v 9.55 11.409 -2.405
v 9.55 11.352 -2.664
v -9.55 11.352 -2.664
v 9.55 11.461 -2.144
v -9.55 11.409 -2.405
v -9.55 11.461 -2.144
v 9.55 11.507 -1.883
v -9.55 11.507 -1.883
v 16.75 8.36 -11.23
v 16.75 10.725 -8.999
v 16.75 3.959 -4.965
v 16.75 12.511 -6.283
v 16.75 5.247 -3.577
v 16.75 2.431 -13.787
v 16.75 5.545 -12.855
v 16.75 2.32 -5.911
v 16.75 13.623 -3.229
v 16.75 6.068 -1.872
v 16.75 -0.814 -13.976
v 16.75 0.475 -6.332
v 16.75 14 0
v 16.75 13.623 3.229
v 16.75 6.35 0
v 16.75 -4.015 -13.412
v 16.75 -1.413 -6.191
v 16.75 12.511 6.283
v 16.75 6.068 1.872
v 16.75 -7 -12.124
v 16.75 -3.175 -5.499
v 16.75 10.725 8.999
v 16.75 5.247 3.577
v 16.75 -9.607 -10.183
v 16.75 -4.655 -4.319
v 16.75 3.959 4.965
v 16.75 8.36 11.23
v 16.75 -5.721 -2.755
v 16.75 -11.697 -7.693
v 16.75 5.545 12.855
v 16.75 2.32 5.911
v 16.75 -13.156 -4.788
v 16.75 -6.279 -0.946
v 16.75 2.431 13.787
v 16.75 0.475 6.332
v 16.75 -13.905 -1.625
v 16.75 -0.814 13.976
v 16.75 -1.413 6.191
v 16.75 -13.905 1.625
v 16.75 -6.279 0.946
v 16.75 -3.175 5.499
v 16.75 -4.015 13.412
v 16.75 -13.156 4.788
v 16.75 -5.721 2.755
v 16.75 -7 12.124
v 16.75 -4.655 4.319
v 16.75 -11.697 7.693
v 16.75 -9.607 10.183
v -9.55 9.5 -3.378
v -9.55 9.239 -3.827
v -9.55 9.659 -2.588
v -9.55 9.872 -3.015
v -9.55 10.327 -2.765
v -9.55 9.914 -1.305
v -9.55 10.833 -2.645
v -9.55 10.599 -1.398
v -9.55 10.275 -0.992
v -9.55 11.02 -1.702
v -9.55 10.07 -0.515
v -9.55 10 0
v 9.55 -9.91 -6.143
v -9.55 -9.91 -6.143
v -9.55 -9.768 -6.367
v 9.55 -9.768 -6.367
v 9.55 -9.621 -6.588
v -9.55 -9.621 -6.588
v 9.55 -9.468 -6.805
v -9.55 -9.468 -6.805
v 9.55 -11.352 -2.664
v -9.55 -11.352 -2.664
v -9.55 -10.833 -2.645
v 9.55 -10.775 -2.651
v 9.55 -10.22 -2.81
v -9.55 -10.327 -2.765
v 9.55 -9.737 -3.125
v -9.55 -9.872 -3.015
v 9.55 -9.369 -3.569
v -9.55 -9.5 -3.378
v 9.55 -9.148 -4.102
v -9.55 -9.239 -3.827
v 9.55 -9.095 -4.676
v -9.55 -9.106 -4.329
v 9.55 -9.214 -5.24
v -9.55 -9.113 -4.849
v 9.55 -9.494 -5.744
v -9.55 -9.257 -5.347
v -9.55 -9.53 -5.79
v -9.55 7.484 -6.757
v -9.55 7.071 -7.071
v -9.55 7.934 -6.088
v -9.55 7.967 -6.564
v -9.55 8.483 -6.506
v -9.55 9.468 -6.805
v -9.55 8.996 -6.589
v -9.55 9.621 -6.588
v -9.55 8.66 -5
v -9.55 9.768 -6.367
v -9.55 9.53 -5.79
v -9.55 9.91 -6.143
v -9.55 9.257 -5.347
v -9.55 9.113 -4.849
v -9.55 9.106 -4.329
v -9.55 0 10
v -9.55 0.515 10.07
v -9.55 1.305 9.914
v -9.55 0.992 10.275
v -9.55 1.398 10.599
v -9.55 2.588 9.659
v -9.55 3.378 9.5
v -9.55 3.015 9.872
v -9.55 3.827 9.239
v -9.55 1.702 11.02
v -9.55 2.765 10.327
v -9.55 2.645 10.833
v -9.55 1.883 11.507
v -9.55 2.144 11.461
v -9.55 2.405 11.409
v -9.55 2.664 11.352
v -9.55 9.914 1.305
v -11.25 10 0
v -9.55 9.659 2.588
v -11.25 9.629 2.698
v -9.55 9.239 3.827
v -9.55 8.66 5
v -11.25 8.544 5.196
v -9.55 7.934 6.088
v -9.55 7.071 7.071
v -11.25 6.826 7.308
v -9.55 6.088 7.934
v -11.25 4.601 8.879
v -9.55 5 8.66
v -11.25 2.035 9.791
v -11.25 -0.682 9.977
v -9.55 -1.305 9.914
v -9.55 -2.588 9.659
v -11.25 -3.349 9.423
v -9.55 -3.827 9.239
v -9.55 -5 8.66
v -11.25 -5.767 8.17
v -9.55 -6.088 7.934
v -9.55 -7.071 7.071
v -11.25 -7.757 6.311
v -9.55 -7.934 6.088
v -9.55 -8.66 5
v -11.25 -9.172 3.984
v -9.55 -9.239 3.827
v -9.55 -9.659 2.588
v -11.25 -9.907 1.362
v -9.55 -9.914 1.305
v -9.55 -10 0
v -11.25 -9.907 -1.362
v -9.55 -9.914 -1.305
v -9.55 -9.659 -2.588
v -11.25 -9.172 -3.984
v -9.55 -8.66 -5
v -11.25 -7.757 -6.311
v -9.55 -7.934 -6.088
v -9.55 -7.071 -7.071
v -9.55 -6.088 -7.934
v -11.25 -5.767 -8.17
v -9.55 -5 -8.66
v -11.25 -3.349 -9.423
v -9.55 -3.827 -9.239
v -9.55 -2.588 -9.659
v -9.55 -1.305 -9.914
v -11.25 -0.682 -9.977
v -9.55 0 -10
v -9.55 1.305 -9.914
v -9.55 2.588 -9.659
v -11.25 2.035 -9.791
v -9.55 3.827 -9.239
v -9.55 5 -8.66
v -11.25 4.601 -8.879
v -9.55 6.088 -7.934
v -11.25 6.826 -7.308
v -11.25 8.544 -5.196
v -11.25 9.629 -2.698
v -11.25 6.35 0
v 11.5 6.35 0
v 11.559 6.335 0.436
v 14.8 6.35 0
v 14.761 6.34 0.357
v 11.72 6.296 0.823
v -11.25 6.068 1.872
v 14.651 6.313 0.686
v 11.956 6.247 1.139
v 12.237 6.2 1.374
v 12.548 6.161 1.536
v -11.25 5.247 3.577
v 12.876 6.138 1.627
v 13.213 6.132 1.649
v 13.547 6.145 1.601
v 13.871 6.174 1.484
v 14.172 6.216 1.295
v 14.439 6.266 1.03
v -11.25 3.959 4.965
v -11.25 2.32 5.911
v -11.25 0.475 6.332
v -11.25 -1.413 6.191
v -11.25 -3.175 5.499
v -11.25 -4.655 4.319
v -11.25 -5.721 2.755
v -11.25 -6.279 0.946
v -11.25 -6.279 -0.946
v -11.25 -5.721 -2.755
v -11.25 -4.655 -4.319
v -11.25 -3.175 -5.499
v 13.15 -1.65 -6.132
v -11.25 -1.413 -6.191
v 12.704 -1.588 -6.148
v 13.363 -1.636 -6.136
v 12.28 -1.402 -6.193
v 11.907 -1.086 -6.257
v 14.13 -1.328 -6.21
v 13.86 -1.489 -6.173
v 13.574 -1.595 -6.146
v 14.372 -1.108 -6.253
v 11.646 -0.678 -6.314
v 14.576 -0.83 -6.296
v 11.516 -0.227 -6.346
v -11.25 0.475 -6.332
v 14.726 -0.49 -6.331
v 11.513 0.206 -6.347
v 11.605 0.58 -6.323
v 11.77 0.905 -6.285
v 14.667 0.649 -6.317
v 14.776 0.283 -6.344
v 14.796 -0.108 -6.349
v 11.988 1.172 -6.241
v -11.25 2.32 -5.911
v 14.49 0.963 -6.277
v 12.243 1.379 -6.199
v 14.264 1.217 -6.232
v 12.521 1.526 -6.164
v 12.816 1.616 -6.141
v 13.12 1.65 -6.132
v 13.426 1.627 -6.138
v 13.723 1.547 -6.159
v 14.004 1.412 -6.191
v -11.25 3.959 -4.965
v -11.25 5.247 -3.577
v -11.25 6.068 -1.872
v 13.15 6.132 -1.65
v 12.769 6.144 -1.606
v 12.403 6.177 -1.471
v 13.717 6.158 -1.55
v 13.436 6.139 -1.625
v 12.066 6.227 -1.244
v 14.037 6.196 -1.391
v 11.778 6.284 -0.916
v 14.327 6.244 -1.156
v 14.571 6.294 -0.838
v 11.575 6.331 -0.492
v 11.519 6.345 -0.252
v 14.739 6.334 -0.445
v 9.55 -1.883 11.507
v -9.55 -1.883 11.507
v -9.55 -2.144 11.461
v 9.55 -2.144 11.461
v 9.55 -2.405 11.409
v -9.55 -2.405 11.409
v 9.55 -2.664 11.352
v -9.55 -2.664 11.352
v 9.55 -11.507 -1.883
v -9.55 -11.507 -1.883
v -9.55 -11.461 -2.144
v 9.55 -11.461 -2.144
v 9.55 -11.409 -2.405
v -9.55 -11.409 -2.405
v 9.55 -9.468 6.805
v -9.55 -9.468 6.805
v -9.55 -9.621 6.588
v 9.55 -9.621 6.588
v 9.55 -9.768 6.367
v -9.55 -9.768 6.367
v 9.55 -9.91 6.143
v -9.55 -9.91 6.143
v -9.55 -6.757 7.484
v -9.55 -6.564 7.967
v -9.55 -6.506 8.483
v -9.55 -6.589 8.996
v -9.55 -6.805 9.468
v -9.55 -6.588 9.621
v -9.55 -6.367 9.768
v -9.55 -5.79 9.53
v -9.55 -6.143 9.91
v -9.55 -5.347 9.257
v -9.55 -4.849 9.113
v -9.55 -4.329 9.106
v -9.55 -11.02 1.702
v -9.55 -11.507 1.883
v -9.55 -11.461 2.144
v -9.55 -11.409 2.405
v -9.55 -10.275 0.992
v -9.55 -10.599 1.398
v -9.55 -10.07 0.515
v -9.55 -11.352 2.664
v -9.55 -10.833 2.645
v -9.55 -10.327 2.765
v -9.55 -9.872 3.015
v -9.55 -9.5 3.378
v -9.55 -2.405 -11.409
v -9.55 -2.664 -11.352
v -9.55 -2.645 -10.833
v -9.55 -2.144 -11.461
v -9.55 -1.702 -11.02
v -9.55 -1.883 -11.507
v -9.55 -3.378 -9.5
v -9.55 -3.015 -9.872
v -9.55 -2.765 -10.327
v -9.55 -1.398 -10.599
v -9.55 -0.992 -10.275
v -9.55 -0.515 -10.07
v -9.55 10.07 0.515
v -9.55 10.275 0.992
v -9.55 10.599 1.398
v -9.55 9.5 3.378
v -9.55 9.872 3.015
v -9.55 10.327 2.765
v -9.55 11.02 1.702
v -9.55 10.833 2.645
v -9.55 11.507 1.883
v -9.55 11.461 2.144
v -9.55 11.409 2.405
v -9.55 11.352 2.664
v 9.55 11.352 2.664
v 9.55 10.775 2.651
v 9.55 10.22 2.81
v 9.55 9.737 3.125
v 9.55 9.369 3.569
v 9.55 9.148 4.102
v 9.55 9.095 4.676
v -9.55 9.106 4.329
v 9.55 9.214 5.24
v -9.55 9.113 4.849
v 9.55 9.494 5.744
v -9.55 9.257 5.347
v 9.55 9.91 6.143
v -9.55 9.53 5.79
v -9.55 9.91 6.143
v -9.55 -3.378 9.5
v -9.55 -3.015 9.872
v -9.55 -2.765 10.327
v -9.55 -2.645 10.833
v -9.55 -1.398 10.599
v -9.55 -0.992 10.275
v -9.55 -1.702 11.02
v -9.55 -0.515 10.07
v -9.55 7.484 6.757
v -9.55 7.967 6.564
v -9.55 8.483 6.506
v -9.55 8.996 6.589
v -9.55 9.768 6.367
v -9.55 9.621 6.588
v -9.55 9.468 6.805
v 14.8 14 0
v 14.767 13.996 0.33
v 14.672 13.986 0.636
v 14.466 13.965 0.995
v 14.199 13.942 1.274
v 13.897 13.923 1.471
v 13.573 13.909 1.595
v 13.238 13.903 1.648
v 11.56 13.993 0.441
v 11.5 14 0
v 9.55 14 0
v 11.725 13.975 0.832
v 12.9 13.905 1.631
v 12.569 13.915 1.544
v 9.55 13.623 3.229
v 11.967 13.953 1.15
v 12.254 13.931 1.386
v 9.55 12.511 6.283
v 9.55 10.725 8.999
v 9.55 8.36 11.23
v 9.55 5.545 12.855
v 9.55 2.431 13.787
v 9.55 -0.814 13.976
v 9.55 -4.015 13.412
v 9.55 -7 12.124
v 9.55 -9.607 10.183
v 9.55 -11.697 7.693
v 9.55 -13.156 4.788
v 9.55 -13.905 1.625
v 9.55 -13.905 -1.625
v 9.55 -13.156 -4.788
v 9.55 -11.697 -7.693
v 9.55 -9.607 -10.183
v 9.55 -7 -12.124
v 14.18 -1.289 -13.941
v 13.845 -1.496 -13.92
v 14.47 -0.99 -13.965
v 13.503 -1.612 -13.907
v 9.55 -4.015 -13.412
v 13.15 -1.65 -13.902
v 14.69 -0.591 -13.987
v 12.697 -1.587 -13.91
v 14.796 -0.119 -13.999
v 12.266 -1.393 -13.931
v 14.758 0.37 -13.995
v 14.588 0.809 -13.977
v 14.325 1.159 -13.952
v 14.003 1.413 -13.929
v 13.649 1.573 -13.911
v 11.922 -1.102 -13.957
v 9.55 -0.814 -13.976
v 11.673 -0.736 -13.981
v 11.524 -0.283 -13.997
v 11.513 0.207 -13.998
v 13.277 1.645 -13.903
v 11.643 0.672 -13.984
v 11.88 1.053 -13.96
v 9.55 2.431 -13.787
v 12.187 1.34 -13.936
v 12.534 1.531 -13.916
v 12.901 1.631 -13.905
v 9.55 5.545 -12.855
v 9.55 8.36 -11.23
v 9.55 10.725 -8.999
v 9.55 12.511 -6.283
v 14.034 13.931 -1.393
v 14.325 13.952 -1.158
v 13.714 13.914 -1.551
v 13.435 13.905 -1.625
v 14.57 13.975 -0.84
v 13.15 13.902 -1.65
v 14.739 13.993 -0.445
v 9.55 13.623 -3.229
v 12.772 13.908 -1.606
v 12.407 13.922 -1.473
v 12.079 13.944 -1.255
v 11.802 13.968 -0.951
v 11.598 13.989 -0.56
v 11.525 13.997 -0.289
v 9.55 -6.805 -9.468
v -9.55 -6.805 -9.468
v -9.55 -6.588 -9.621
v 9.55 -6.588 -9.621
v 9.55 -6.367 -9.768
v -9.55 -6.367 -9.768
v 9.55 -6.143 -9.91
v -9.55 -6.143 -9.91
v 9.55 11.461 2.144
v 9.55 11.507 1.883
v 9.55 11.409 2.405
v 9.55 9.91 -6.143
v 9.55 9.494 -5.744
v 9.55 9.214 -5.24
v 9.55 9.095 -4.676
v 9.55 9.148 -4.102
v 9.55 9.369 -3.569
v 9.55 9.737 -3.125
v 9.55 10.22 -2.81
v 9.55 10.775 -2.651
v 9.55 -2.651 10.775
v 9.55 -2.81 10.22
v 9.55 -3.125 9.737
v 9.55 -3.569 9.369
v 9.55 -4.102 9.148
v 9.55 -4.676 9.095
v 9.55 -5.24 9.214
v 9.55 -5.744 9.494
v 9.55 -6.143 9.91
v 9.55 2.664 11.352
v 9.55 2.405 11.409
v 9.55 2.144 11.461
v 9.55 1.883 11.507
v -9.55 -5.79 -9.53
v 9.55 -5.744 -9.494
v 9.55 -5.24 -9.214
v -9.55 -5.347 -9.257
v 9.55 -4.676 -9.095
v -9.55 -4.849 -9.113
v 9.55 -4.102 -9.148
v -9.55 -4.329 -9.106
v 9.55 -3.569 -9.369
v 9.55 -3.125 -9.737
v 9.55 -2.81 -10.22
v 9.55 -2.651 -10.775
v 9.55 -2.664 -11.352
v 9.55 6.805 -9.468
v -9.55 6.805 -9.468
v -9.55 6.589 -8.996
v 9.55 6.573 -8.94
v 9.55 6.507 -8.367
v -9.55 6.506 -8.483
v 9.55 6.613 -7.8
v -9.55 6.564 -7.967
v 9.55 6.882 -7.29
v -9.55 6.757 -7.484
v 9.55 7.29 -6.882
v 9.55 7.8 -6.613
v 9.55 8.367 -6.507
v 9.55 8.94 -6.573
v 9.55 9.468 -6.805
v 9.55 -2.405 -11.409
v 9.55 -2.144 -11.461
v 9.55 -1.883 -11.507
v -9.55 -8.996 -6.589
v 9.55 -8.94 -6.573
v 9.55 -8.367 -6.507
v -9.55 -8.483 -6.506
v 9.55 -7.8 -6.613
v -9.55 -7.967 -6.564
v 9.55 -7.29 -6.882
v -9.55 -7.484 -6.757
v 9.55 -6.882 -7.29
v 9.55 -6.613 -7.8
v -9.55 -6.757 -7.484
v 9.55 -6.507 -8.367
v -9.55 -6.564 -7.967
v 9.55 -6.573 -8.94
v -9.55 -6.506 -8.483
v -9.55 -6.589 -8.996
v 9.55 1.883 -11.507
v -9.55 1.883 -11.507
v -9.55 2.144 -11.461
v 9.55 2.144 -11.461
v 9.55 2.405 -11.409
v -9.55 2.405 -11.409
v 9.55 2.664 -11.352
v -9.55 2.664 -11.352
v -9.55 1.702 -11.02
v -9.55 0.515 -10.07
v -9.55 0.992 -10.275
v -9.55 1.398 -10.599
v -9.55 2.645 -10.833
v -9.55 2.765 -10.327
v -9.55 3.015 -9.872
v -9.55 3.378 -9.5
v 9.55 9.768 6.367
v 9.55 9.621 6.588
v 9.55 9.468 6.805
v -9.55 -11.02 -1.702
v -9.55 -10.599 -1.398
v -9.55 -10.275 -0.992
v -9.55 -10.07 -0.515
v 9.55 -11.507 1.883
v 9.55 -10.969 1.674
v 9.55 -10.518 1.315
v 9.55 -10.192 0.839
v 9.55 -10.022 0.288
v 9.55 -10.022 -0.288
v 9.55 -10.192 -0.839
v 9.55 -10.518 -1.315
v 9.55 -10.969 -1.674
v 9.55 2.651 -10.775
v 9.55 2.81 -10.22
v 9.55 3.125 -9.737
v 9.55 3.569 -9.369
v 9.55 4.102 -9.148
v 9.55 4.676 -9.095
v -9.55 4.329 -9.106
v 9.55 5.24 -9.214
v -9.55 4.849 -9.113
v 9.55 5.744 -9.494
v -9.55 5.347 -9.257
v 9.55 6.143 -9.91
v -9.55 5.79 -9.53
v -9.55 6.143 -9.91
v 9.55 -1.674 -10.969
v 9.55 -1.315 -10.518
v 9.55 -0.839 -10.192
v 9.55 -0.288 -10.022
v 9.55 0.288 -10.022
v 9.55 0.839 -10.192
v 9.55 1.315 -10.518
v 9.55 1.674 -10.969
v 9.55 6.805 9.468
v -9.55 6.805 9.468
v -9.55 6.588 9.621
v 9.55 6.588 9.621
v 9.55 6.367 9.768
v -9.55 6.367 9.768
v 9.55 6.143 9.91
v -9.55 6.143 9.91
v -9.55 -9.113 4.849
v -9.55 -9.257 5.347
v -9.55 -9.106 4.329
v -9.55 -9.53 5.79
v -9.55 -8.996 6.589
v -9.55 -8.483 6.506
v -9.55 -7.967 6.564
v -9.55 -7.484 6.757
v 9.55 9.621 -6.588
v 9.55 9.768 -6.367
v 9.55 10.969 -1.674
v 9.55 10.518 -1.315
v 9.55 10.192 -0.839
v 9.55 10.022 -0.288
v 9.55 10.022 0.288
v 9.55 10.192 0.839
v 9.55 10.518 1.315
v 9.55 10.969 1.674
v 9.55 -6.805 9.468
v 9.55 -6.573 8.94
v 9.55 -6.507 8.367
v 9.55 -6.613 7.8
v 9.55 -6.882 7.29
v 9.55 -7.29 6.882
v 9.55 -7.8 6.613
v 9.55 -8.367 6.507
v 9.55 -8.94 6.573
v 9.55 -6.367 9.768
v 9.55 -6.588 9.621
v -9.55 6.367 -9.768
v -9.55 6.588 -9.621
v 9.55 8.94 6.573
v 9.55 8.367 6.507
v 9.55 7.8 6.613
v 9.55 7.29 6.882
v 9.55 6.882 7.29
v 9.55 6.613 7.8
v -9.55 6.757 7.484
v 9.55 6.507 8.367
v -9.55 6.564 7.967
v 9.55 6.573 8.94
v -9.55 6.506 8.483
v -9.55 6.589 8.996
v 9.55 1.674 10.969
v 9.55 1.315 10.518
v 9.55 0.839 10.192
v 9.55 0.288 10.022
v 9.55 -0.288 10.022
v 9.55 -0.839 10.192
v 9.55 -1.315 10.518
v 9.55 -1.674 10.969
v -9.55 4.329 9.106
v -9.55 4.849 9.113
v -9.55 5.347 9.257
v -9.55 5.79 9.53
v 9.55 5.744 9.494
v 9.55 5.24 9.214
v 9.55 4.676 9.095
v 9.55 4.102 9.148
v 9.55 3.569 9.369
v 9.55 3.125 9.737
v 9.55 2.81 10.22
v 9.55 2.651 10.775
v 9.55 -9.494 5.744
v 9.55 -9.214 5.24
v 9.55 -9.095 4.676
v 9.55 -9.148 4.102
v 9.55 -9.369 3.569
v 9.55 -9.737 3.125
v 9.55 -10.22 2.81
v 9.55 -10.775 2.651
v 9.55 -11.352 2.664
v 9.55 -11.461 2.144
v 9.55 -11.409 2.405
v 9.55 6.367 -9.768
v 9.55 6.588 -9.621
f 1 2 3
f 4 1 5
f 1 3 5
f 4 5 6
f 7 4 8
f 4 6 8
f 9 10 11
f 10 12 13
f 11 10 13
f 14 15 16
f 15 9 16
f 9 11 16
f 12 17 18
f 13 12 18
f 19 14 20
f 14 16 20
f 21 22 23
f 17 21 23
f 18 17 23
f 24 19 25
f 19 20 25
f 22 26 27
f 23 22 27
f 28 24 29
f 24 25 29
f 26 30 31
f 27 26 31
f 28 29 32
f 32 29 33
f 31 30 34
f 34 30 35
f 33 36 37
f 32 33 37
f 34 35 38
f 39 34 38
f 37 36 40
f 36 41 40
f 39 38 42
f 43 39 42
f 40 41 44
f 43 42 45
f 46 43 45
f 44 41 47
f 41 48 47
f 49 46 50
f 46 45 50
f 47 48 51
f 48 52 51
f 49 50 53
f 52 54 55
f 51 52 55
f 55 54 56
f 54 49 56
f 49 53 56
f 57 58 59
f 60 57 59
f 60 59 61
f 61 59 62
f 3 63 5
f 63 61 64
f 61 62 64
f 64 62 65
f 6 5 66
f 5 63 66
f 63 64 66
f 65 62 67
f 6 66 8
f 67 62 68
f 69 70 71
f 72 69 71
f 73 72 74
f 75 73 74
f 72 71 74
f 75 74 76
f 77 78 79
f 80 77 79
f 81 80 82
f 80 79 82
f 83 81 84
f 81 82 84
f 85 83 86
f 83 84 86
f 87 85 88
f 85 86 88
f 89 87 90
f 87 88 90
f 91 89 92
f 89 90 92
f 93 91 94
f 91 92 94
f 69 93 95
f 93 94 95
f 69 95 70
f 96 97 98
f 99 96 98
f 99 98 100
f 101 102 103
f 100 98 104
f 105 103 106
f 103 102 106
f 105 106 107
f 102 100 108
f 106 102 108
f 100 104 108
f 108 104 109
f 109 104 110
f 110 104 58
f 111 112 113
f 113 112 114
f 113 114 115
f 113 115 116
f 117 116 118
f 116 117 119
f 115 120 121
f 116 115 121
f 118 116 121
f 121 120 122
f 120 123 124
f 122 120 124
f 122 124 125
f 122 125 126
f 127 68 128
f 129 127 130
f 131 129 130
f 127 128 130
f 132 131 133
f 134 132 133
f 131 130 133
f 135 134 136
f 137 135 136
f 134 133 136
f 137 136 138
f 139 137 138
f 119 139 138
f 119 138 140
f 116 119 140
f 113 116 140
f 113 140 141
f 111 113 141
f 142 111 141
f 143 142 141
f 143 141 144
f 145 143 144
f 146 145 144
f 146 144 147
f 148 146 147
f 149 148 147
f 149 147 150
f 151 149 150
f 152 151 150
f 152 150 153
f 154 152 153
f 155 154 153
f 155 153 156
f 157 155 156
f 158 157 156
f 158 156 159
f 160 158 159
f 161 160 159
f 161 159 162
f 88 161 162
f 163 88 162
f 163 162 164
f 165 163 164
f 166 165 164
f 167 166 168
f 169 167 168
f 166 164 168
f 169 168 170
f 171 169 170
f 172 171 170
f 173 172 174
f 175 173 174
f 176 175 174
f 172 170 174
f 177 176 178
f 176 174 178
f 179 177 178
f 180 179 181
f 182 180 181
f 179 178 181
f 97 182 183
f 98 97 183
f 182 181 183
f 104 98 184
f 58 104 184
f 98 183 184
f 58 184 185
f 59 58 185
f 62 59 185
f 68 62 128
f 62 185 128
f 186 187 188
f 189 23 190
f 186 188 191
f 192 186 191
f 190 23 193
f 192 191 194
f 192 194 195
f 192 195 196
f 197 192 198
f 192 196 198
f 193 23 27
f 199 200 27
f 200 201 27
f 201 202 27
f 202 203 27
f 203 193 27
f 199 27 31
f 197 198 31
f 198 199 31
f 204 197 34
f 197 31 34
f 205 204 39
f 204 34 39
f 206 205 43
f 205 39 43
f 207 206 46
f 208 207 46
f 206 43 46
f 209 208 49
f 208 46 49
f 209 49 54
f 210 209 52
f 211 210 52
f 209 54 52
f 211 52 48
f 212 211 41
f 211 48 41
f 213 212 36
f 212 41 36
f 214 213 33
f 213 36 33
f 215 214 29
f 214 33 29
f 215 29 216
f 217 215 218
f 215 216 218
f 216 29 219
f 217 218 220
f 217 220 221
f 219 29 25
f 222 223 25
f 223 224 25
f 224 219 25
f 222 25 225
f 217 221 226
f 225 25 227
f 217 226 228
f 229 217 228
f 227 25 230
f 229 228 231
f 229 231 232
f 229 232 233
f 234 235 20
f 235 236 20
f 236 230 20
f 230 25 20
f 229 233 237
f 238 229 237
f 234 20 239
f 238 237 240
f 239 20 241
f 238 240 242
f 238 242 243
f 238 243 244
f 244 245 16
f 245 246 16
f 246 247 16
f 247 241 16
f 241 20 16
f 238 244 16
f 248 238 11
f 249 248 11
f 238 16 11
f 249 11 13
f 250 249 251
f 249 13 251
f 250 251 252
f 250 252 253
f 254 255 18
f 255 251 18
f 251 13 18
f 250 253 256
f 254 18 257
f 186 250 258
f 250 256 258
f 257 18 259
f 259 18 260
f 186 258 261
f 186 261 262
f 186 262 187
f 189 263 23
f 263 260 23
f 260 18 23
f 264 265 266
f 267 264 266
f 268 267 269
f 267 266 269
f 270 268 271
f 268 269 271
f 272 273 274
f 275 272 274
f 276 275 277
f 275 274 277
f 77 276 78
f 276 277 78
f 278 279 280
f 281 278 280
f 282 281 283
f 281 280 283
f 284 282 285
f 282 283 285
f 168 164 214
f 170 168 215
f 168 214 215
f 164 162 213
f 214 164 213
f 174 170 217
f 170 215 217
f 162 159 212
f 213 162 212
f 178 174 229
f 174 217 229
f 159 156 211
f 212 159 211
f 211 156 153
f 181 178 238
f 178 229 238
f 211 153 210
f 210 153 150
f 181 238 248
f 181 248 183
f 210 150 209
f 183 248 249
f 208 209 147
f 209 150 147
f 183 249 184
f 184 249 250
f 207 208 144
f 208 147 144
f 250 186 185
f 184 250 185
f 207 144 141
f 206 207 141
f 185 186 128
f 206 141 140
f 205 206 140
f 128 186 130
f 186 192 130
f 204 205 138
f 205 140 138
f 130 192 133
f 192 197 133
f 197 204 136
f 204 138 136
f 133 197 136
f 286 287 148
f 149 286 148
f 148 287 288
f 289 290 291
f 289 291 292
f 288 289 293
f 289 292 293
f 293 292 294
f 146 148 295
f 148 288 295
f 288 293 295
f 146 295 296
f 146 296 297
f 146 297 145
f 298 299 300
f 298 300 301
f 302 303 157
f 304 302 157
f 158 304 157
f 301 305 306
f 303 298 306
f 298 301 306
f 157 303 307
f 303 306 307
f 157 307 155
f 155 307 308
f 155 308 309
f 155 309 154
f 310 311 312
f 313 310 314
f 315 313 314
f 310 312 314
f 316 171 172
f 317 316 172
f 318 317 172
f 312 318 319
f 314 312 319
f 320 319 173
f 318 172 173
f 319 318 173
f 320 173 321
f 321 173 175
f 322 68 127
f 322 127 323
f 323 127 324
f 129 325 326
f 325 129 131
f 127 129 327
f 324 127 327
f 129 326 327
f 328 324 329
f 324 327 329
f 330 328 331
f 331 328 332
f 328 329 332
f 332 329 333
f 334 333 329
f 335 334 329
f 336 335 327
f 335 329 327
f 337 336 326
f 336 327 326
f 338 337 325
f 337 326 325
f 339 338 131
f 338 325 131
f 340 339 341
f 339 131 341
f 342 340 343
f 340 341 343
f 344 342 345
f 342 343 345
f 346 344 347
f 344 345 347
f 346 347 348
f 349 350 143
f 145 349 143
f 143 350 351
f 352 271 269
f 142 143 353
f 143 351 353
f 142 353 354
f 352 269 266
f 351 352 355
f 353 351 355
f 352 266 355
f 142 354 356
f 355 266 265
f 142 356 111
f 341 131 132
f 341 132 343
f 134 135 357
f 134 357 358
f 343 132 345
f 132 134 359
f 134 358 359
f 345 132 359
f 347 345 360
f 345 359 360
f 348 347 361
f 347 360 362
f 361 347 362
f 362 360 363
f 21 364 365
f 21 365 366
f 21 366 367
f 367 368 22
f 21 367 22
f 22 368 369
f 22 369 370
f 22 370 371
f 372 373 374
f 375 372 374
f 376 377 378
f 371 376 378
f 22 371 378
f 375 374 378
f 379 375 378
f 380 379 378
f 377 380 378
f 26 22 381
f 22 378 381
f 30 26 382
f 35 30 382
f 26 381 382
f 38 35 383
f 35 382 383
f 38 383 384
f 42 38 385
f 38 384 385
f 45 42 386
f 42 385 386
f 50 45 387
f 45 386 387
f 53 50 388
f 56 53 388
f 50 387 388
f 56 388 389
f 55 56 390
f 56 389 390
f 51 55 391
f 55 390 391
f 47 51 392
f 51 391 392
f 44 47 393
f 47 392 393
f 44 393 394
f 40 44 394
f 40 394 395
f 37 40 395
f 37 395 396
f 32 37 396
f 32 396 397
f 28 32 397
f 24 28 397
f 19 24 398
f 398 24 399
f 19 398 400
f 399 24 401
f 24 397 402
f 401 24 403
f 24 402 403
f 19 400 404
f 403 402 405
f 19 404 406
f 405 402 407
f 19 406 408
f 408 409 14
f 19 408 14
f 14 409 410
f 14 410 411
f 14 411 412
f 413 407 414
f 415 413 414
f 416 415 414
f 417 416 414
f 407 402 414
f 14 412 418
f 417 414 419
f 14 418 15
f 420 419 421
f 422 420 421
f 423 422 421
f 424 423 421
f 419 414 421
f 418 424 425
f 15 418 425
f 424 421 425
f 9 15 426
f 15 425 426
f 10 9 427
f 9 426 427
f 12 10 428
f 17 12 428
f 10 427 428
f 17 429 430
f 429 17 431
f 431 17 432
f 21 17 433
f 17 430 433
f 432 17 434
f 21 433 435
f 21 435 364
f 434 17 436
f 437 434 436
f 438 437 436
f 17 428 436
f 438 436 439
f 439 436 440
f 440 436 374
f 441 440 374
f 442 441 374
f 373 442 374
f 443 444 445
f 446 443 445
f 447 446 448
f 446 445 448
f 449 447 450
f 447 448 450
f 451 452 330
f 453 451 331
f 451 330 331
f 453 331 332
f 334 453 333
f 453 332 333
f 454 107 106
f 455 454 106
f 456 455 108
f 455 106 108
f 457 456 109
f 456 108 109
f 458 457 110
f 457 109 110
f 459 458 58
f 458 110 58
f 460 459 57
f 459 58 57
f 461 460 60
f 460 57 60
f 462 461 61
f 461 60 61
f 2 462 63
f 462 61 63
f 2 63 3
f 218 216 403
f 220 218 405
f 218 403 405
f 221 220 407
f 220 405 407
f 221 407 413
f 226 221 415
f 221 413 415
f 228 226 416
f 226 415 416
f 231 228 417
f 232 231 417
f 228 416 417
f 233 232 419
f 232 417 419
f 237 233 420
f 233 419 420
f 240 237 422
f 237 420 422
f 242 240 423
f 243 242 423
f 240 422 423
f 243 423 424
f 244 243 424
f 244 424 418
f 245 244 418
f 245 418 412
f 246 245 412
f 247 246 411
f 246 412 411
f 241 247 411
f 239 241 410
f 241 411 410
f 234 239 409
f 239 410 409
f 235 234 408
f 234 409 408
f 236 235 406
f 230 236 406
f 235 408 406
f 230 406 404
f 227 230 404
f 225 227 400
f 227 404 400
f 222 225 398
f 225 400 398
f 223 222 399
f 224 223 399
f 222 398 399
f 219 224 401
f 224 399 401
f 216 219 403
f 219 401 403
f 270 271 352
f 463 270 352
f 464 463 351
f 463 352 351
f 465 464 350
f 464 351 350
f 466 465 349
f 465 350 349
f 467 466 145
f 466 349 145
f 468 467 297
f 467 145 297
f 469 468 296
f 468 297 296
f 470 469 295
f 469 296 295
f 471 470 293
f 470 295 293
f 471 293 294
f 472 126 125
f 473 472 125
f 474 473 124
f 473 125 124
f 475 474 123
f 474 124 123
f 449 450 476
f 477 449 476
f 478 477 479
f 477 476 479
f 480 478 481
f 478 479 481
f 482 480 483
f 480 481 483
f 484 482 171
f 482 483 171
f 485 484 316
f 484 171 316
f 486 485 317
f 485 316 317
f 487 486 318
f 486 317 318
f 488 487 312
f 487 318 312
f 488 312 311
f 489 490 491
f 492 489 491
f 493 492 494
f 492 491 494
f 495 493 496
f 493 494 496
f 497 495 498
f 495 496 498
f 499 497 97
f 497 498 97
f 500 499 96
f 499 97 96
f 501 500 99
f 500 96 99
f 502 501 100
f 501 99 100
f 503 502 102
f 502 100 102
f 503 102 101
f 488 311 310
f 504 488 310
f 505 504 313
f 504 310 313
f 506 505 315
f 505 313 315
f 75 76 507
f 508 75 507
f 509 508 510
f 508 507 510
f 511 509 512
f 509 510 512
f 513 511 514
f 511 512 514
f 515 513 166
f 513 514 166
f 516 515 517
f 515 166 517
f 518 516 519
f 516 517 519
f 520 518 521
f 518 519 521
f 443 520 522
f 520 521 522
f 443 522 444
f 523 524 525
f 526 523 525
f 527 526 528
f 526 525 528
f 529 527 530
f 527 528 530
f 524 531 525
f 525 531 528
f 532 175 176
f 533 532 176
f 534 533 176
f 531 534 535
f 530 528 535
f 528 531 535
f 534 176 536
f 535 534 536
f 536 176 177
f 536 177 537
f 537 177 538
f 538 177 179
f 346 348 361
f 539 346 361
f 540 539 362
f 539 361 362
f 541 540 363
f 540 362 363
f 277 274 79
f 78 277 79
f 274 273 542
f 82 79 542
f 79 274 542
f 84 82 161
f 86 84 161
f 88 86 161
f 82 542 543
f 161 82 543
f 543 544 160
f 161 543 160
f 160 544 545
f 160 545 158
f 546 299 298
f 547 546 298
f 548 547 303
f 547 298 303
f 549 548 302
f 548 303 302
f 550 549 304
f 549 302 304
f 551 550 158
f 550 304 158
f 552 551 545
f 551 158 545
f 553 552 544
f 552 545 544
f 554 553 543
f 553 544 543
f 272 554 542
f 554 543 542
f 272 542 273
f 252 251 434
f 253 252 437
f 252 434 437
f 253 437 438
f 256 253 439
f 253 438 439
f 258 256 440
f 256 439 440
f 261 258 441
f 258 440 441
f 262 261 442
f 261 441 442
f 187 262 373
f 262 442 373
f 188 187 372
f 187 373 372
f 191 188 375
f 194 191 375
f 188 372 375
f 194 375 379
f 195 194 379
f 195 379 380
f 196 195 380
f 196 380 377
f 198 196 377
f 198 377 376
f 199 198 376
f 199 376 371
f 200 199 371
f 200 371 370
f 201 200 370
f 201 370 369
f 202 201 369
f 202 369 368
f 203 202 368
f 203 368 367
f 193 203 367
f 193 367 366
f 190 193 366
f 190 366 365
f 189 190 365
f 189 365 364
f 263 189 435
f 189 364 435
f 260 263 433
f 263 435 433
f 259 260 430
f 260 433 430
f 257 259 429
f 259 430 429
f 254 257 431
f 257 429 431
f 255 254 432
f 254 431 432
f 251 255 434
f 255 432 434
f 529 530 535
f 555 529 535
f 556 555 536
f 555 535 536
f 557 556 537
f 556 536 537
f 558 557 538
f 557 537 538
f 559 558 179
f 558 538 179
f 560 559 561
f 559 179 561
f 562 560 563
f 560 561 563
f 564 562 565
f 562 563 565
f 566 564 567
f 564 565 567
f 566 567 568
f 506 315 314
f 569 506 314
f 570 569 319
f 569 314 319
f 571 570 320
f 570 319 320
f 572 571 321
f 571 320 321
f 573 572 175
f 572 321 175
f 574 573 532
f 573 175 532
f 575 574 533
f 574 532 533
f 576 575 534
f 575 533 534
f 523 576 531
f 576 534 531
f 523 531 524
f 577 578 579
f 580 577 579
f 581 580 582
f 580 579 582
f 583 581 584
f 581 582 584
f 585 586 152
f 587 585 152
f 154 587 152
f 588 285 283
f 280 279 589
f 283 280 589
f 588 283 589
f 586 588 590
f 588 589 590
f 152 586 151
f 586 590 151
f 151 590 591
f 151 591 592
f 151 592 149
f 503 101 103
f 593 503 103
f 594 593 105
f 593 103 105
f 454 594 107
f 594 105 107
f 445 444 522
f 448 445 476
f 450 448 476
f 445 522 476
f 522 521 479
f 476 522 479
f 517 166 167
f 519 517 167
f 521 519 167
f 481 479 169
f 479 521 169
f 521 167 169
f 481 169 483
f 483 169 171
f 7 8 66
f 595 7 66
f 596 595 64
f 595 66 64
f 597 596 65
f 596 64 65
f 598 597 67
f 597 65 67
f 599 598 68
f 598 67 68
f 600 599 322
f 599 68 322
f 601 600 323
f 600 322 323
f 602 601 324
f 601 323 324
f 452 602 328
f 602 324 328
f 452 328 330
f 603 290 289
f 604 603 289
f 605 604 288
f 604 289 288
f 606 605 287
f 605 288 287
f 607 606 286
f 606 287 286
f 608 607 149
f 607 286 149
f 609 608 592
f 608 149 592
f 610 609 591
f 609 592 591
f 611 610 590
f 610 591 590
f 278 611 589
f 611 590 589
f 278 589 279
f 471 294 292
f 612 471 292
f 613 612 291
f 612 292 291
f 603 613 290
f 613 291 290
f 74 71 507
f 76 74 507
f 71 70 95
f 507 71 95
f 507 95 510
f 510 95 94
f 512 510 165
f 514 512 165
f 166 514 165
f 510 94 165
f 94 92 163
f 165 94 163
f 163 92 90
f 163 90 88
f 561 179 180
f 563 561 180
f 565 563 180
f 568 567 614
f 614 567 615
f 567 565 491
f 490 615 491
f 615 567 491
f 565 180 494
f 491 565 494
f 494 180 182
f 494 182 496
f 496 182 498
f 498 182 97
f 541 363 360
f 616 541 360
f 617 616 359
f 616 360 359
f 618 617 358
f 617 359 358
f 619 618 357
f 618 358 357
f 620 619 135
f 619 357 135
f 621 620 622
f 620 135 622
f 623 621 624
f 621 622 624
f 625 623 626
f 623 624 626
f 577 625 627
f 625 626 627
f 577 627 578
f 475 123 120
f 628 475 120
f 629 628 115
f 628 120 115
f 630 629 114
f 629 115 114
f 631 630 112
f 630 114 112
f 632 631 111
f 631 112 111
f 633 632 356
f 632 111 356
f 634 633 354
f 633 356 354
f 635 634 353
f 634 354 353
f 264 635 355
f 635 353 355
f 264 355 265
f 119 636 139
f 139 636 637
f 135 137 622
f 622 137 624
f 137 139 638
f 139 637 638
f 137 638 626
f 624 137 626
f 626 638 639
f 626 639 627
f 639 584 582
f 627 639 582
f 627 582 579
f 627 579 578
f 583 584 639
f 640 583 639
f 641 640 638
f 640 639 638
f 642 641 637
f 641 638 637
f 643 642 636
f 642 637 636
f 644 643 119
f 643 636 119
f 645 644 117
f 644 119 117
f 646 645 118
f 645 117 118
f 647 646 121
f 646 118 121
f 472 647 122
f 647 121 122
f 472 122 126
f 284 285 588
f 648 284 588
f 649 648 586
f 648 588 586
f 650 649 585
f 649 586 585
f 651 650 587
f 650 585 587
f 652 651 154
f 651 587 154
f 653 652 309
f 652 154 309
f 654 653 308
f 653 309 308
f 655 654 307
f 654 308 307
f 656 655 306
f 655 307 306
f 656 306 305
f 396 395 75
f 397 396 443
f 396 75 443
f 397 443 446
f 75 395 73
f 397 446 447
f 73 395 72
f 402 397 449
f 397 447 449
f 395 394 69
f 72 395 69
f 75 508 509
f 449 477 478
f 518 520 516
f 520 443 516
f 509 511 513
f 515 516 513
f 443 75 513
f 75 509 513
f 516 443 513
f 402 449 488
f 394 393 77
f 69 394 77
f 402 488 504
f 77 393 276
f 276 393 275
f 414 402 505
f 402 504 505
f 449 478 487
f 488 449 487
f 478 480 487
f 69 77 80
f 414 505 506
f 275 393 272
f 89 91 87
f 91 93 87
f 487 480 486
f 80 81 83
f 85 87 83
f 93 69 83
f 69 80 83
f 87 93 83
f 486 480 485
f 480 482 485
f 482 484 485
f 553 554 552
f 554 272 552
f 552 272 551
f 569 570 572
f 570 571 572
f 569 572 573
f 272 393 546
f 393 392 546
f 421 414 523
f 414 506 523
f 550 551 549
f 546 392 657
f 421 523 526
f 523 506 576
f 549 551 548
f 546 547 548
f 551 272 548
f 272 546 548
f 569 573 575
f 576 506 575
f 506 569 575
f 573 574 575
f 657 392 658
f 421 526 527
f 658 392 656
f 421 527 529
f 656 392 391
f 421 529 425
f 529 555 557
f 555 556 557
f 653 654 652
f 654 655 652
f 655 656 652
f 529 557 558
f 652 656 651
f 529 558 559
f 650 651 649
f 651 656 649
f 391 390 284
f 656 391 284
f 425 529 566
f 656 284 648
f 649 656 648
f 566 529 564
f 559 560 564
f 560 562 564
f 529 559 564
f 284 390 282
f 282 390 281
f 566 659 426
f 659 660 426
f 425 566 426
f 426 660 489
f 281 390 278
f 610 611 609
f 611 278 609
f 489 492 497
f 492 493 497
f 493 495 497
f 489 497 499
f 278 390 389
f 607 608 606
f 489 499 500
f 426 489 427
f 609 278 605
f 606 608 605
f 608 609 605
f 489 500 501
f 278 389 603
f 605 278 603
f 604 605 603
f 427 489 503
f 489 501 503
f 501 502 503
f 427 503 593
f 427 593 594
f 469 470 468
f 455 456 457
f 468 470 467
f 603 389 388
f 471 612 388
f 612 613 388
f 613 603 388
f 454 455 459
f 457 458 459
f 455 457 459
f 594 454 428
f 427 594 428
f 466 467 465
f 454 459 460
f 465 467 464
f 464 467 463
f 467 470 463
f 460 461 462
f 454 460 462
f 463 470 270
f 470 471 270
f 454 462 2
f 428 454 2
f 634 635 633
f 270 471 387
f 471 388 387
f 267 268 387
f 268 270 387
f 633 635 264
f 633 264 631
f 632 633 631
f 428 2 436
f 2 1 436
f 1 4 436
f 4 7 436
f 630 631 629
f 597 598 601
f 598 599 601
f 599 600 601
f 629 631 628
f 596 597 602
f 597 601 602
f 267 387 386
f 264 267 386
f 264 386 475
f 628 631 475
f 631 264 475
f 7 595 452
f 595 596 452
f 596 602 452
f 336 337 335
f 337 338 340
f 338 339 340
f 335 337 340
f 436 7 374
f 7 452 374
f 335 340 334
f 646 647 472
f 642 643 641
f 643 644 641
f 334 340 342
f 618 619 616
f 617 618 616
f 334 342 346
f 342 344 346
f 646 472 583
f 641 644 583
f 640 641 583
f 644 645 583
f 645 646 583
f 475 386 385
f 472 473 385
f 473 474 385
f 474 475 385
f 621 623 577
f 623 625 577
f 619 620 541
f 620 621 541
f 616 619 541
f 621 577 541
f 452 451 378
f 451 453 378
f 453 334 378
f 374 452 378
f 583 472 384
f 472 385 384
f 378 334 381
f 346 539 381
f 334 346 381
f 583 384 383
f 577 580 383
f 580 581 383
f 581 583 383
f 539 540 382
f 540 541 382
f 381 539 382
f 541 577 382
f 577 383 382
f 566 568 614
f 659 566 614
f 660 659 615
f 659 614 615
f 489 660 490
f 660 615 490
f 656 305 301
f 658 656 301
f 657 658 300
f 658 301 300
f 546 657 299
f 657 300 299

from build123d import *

# Parameters (mm, degrees)
SKETCH2_R          = 1.93
CUT_EXTRUDE1_DEPTH = 19.1
CIRPATTERN1_COUNT  = 16
SKETCH3_W          = 1.65
SKETCH3_H          = 14.001
CIRPATTERN2_COUNT  = 2
CIRPATTERN2_ANGLE  = 90


with BuildPart() as part:
    # Sketch1 → Revolve1 (revolve)
    with BuildSketch(Plane.XY):
        Polygon((-11.25, 6.35), (16.75, 6.35), (16.75, 14), (9.55, 14), (9.55, 11.66), (-9.55, 11.66), (-9.55, 10), (-11.25, 10), align=None)
    revolve(axis=Axis((0, 0, 0), (1, 0, 0)))

    # Sketch2 → Cut-Extrude1 (cut)
    with BuildSketch(Plane.ZY.offset(9.55)):
        with Locations((0, 11.93)):
            Circle(SKETCH2_R)
    cut_extrude1 = extrude(amount=-CUT_EXTRUDE1_DEPTH, mode=Mode.SUBTRACT)

    # CirPattern1: Cut-Extrude1 ×16 about axis
    cirpattern1_axis = Axis((0, 0, 0), (1, 0, 0))
    for i in range(1, CIRPATTERN1_COUNT):
        add(cut_extrude1.rotate(cirpattern1_axis, i * 360 / CIRPATTERN1_COUNT), mode=Mode.SUBTRACT)

    # Sketch3 → M4x0.7 Tapped Hole1 (revolve, cut)
    with BuildSketch(Plane(origin=(13.15, 0, 0), x_dir=(0, 0, -1), z_dir=(1, 0, 0))):
        with Locations((0.825, 7.0005)):
            Rectangle(SKETCH3_W, SKETCH3_H)
    m4x0_7_tapped_hole1 = revolve(axis=Axis((13.15, -6.35, 0), (0, 1, 0)), mode=Mode.SUBTRACT)

    # CirPattern2: M4x0.7 Tapped Hole1 ×2 about axis
    cirpattern2_axis = Axis((0, 0, 0), (-1, 0, 0))
    for i in range(1, CIRPATTERN2_COUNT):
        add(m4x0_7_tapped_hole1.rotate(cirpattern2_axis, i * CIRPATTERN2_ANGLE / (CIRPATTERN2_COUNT - 1)), mode=Mode.SUBTRACT)


solid = part.part
